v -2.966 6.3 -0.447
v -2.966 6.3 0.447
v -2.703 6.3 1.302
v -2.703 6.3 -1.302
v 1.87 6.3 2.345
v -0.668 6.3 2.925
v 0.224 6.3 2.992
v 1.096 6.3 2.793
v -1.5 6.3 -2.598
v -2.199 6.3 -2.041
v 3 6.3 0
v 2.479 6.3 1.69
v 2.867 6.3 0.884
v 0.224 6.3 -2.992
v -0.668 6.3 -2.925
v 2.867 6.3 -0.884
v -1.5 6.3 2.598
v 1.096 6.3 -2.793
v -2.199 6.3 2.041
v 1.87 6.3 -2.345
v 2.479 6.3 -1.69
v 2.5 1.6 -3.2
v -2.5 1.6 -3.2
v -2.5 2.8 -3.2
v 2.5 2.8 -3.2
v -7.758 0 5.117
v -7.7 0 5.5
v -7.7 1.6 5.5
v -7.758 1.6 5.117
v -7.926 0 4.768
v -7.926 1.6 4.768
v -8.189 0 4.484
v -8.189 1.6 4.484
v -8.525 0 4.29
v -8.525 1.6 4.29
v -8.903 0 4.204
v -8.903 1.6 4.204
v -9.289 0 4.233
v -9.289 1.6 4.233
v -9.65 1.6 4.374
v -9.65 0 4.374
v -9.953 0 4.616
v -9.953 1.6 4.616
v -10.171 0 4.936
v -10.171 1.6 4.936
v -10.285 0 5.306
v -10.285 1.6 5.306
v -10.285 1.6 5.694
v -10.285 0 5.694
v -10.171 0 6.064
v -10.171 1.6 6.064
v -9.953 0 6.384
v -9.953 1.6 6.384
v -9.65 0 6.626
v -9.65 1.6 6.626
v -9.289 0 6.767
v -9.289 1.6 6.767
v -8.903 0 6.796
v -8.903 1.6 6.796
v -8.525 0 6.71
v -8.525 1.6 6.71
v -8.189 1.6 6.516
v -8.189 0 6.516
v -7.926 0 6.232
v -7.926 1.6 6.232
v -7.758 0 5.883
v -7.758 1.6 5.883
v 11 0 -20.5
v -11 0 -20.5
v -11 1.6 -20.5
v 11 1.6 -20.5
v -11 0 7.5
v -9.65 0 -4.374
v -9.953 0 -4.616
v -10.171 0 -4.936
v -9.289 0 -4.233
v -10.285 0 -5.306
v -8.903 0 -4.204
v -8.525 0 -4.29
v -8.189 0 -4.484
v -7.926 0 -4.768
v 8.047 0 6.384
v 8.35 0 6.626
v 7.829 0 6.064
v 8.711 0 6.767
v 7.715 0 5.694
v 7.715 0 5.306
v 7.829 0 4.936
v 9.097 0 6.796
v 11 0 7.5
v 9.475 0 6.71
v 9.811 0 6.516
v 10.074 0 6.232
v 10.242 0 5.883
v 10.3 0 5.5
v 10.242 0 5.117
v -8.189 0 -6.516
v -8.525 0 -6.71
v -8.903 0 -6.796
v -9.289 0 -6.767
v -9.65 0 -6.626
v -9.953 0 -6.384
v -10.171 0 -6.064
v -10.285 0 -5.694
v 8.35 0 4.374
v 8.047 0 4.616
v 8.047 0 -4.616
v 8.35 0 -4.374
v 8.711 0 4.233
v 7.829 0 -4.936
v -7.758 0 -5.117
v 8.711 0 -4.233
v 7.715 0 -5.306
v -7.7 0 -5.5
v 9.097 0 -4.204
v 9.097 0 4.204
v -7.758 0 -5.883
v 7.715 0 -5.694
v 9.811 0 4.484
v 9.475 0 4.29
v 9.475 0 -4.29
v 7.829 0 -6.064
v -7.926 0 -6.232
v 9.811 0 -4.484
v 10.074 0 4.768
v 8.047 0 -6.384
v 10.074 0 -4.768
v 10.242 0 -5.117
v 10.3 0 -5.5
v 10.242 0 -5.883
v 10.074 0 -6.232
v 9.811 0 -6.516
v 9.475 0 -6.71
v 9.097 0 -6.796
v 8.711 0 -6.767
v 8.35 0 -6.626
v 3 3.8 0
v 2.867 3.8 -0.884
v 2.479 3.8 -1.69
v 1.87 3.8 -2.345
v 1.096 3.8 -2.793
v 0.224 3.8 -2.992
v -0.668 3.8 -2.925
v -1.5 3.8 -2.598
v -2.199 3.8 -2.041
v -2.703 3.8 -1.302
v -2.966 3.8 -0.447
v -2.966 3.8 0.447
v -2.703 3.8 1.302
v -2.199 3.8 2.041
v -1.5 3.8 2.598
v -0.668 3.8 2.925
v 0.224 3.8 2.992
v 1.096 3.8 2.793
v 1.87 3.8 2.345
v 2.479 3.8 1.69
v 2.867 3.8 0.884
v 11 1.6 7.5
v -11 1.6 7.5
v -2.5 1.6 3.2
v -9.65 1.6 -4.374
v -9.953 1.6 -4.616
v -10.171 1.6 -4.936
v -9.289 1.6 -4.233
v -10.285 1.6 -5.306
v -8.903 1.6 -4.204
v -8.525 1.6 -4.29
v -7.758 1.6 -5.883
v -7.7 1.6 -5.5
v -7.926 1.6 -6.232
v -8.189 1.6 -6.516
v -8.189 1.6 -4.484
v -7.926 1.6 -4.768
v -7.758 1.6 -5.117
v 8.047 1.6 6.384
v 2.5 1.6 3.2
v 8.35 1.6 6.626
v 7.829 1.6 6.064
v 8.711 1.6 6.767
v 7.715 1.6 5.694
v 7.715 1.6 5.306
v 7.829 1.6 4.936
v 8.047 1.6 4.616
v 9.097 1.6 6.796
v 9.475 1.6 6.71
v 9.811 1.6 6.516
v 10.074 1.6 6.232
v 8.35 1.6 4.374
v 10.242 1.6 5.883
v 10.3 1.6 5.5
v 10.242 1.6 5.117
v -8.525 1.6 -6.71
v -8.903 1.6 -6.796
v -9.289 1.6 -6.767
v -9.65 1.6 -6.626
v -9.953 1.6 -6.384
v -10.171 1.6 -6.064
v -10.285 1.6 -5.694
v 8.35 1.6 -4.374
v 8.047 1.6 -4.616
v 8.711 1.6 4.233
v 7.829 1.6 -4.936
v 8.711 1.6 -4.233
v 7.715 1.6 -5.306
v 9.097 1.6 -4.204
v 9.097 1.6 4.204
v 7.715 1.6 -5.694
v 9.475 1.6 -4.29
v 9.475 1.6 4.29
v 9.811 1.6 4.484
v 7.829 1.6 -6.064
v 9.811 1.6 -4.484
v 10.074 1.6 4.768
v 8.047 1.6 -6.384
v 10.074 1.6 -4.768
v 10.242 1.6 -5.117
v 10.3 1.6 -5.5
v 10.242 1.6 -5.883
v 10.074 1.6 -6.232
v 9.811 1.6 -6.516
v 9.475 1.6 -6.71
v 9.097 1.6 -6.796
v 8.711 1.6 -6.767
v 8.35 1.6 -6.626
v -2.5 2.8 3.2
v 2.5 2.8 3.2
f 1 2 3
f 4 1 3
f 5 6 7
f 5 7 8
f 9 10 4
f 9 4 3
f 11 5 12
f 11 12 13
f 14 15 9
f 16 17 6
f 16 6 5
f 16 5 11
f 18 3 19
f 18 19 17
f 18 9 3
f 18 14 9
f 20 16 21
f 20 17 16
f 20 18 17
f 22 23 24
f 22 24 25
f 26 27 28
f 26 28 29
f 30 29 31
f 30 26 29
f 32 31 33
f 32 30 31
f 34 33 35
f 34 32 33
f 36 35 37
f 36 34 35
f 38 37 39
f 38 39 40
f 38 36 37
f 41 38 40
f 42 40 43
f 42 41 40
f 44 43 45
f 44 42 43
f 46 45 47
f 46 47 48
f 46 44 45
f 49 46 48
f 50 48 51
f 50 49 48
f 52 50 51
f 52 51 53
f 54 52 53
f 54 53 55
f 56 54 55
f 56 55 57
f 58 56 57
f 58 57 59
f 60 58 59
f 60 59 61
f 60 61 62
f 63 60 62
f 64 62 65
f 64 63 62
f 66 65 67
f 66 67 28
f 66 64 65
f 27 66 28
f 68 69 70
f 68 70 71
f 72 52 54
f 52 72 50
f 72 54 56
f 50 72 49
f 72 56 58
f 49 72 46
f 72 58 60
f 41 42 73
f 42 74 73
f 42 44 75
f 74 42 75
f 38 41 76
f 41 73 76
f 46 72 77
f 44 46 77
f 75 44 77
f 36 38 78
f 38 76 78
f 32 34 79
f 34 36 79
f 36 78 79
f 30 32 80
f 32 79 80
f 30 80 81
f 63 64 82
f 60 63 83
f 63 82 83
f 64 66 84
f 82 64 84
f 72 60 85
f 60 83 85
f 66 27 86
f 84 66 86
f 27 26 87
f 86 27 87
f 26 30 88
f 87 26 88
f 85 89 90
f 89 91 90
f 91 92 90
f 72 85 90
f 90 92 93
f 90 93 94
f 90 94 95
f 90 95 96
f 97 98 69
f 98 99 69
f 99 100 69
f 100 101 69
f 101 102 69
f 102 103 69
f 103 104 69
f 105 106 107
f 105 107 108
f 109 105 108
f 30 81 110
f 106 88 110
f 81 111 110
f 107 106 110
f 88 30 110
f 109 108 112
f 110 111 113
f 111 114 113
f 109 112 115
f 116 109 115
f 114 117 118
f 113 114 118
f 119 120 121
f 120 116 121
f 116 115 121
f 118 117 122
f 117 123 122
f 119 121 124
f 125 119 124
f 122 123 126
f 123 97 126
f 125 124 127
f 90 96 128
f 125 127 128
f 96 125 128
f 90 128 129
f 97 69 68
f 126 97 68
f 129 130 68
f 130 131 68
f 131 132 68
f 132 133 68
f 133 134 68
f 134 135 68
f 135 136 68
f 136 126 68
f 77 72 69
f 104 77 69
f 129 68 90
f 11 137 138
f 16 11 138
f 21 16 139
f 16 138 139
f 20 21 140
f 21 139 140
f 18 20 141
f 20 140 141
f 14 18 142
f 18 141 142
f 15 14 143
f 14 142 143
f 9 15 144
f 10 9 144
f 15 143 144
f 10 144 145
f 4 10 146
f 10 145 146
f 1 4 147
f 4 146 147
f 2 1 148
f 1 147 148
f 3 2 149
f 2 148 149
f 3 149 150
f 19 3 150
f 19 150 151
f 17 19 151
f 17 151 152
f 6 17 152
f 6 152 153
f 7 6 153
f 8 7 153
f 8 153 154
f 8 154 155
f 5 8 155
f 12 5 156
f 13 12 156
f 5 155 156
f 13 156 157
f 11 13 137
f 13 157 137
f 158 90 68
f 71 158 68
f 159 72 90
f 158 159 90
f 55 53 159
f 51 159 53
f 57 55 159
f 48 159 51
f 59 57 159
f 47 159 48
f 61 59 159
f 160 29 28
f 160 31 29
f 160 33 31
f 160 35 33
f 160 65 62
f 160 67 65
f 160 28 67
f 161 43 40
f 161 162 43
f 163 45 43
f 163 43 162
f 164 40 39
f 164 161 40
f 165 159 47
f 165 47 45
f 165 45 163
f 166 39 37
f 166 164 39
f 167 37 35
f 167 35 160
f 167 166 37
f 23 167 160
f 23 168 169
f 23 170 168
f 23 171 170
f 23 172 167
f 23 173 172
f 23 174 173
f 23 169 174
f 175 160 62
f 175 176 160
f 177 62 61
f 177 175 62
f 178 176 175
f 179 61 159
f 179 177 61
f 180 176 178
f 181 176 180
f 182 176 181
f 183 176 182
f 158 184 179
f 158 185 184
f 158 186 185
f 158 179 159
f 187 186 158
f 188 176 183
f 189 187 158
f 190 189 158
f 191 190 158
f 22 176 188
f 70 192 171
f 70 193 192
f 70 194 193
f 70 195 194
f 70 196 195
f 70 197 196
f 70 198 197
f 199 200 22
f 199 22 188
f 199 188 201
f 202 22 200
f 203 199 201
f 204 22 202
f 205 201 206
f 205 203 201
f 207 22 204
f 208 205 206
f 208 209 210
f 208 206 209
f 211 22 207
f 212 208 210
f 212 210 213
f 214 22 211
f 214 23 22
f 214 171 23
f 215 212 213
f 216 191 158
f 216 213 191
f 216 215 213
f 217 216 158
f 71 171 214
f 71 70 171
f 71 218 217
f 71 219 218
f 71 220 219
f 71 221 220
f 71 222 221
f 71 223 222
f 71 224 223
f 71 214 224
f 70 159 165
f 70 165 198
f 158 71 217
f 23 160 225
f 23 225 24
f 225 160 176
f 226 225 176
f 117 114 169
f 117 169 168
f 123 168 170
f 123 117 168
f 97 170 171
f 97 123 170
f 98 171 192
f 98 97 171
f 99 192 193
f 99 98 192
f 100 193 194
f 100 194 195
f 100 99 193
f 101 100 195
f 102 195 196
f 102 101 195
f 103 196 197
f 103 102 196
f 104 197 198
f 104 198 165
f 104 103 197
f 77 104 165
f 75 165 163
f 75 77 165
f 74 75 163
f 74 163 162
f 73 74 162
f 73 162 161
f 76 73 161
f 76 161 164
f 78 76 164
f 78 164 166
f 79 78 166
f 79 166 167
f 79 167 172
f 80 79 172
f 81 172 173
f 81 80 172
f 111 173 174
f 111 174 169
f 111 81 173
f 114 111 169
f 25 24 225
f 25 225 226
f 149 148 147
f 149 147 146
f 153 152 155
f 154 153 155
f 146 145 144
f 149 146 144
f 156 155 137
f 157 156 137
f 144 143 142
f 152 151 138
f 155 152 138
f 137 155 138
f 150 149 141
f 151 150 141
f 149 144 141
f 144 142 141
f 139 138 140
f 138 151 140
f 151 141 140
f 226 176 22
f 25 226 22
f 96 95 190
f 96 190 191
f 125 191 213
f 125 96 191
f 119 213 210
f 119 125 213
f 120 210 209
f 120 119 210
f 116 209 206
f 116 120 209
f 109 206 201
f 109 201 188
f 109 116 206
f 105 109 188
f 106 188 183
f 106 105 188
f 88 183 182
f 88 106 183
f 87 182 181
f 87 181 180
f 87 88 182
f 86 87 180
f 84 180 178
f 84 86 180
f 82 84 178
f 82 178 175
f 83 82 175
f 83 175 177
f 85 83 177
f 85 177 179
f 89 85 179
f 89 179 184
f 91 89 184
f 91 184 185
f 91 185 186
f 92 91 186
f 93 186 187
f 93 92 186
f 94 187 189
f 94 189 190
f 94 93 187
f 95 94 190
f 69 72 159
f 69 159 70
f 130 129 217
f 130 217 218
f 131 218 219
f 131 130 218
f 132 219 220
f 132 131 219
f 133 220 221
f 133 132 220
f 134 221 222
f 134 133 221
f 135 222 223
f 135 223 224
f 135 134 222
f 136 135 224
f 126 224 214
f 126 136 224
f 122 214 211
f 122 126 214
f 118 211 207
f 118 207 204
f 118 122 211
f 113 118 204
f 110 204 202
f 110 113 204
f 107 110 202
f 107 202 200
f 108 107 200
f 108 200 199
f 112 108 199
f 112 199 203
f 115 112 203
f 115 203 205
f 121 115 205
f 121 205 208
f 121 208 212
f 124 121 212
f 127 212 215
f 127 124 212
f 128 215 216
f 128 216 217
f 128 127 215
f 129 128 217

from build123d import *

# Parameters (mm, degrees)
ESQUISSE1_W        = 22
ESQUISSE1_H        = 28
ESQUISSE1_R        = 1.3
BOSS_EXTRU_1_DEPTH = 1.6
ESQUISSE2_W        = 5
ESQUISSE2_H        = 6.4
BOSS_EXTRU_2_DEPTH = 1.2
BOSS_EXTRU_3_START = 1
ESQUISSE3_R        = 3
BOSS_EXTRU_3_DEPTH = 2.5


with BuildPart() as part:
    # Esquisse1 → Boss.-Extru.1 (new body)
    with BuildSketch(Plane(origin=(0, 0, 0), x_dir=(1, 0, 0), z_dir=(0, 1, 0))):
        with Locations((0, 6.5)):
            Rectangle(ESQUISSE1_W, ESQUISSE1_H)
        with Locations((-9, 5.5)):
            Circle(ESQUISSE1_R, mode=Mode.SUBTRACT)
        with Locations((9, 5.5)):
            Circle(ESQUISSE1_R, mode=Mode.SUBTRACT)
        with Locations((9, -5.5)):
            Circle(ESQUISSE1_R, mode=Mode.SUBTRACT)
        with Locations((-9, -5.5)):
            Circle(ESQUISSE1_R, mode=Mode.SUBTRACT)
    extrude(amount=BOSS_EXTRU_1_DEPTH)

    # Esquisse2 → Boss.-Extru.2 (add)
    with BuildSketch(Plane(origin=(0, 1.6, 0), x_dir=(1, 0, 0), z_dir=(0, 1, 0))):
        Rectangle(ESQUISSE2_W, ESQUISSE2_H)
    extrude(amount=BOSS_EXTRU_2_DEPTH)


with BuildPart() as body_2:
    # Esquisse3 → Boss.-Extru.3 (new body)
    with BuildSketch(Plane(origin=(0, 2.8, 0), x_dir=(1, 0, 0), z_dir=(0, 1, 0)).offset(BOSS_EXTRU_3_START)):
        Circle(ESQUISSE3_R)
    extrude(amount=BOSS_EXTRU_3_DEPTH)


solid = Compound([part.part, body_2.part])
